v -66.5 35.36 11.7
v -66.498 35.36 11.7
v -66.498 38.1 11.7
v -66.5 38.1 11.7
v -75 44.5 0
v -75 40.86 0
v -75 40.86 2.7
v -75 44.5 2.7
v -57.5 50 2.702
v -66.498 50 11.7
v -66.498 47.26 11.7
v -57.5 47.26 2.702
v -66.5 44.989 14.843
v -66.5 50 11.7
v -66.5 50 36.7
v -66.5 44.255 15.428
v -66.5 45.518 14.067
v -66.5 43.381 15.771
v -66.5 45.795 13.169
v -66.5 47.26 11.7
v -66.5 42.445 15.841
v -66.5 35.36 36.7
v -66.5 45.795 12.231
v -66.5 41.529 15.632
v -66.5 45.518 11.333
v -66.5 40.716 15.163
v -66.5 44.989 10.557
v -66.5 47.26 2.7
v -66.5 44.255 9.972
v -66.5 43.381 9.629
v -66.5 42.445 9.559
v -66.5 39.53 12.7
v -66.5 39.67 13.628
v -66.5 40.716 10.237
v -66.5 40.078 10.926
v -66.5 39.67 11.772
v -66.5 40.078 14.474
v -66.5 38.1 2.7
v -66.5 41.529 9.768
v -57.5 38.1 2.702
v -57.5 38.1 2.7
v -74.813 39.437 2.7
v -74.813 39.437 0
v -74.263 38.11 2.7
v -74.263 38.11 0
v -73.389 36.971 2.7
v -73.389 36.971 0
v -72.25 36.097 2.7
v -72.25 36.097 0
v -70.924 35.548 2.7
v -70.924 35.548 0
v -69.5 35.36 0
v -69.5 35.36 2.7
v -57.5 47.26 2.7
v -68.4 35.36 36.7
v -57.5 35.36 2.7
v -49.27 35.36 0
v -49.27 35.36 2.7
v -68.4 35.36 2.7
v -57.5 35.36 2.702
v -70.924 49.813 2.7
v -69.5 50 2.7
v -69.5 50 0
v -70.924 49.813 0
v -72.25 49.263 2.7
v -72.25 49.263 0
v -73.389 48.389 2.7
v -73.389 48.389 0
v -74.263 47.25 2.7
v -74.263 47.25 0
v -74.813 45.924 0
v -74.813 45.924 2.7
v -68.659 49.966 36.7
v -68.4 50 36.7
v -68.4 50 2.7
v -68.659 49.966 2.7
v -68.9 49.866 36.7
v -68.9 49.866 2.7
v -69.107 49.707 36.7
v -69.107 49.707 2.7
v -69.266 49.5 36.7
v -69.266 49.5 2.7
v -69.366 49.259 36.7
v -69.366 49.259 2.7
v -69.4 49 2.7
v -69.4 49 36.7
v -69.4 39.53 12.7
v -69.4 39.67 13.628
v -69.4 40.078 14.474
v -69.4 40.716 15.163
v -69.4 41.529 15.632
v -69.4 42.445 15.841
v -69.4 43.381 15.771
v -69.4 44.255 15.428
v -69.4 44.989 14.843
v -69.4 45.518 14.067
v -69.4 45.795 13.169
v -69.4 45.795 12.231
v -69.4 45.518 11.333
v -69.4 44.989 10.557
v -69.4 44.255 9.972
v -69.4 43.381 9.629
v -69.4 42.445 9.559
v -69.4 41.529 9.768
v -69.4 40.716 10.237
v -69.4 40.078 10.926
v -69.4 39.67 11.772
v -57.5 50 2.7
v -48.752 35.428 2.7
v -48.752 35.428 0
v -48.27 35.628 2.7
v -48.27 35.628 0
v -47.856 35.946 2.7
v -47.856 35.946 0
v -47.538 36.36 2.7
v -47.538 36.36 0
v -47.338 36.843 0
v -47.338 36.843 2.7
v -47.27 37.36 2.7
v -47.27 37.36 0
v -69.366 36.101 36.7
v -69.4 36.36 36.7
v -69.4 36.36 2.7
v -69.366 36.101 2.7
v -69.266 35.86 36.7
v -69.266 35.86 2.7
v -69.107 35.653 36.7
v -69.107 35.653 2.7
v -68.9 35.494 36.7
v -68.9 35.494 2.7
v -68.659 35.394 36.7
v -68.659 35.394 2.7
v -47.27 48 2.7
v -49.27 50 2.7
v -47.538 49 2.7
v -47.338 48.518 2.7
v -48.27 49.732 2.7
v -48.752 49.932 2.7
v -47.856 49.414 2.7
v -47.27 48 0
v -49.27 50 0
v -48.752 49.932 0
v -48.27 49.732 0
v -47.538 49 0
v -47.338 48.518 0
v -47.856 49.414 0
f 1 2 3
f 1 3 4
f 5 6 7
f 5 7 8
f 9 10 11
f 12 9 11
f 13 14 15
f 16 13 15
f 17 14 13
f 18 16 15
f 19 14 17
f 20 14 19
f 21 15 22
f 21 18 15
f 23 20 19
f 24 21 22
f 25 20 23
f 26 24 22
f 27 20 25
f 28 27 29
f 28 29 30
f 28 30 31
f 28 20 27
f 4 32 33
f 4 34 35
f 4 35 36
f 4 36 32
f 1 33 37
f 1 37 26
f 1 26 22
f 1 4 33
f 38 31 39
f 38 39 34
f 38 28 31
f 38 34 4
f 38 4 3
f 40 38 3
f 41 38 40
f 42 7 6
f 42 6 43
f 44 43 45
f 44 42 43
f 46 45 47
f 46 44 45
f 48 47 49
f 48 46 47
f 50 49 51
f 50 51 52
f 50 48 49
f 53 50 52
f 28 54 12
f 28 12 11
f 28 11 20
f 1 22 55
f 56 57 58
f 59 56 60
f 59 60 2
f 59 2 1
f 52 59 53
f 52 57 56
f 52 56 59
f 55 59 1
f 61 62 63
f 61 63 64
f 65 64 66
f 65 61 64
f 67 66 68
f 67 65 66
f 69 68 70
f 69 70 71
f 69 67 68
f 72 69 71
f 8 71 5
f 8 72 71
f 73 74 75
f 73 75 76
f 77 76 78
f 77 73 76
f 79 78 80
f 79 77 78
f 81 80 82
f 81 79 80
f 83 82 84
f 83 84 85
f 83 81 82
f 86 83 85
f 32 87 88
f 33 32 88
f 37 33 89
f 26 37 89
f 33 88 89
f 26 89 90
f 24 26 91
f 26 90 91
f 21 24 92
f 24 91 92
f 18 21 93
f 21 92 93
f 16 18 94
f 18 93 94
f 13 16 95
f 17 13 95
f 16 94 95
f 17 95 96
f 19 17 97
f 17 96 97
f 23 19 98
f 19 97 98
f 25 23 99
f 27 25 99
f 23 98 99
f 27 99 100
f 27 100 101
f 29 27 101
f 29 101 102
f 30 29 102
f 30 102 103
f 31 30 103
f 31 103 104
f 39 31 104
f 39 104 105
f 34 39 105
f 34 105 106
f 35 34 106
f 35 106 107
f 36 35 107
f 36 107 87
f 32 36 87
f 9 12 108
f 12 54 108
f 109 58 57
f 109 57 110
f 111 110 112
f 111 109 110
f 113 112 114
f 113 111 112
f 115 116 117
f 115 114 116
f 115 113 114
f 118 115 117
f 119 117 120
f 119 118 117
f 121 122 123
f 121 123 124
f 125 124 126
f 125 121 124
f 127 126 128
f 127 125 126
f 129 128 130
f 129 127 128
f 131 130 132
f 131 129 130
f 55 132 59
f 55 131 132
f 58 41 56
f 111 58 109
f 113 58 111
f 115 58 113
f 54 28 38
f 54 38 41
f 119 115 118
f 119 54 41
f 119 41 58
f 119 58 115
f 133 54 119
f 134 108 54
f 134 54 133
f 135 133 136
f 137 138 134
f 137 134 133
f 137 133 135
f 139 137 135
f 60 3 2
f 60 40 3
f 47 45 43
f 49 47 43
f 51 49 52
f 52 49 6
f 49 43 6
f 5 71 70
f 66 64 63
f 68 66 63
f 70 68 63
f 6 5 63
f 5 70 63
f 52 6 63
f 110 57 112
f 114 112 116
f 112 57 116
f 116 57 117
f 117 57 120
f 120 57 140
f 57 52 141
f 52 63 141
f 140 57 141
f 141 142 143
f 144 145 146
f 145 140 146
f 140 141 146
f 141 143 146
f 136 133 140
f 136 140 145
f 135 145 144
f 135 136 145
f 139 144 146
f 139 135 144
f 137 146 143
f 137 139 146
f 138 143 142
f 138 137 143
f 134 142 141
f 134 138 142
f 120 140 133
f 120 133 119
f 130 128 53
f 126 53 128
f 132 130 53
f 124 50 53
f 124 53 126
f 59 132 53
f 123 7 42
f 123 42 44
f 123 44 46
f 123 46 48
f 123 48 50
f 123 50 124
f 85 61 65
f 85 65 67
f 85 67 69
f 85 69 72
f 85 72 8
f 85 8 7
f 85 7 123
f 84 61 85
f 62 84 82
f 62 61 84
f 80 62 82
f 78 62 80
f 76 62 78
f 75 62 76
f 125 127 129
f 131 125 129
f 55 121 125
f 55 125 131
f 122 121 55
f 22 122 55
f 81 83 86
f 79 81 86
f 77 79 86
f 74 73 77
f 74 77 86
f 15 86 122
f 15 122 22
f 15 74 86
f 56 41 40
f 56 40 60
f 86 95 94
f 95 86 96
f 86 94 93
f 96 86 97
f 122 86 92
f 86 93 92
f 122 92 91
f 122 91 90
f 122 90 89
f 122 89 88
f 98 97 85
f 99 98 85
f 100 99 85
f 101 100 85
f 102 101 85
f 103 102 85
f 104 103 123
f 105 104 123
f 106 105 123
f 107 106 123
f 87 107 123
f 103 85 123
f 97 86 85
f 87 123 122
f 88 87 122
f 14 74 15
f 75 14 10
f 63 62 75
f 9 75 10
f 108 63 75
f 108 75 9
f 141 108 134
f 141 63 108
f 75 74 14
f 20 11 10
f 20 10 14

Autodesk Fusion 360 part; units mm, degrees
sketch "Skizze1" plane through (0, 0, 0) normal (0, 0, 1) x (1, 0, 0)
  line L0 (-75, 50) -> (-47.27, 50)
  line L1 (-47.27, 50) -> (-47.27, 35.3603)
  line L2 (-47.27, 35.3603) -> (-75, 35.3603)
  line L3 (-75, 35.3603) -> (-75, 50)
  line L4 (-69.4, 50) -> (-69.4, 35.3603)
  line L5 (-66.5, 50) -> (-66.5, 35.3603)
  dimension "d1" = 27.73
  dimension "d2" = 5.6
  dimension "d3" = 2.9
extrude "Extrusion1" add sketch "Skizze1" along normal blind 2.7 contours L0 L2 L3 L4 | L0 L1 L2 L5 makes body 1 at (-73.1333, 45.1201, 0) makes body 2 at (-60.09, 45.1201, 0)
extrude "Extrusion2" add sketch "Skizze1" along normal blind 36.7 contours L0 L2 L4 L5 bodies 1 2
sketch "Skizze2" plane through (-69.4, 0, 0) normal (-1, 0, 0) x (0, -1, 0)
  line L0 (-50, 2.7) -> (-35.3603, 2.7)
  line L1 (-35.3603, 2.7) -> (-35.3603, 36.7)
  line L2 (-35.3603, 36.7) -> (-50, 36.7)
  line L3 (-50, 36.7) -> (-50, 2.7)
  line L4 (-42.6802, 2.7) -> (-42.6802, 36.7) construction
  line L5 (-50, 12.7) -> (-35.3603, 12.7) construction
  line L6 (-50, 2.7) -> (-35.3603, 2.7) construction
  circle A0 centre (-42.6802, 12.7) radius 3.15
  dimension "d8" = 10
  dimension "d9" = 6.3
extrude "Extrusion3" cut sketch "Skizze2" against normal blind 3 contours A0 bodies 1
fillet "Abrundung1" radius 5.5 2 edges at (-75, 50, 1.35) (-75, 35.3603, 1.35) on bodies 1
sketch "Skizze3" plane through (0, 0, 2.7) normal (0, 0, 1) x (-1, 0, 0)
  line L0 (47.27, -50) -> (66.5, -50)
  line L1 (66.5, -50) -> (66.5, -35.3603)
  line L2 (66.5, -35.3603) -> (47.27, -35.3603)
  line L3 (47.27, -35.3603) -> (47.27, -50)
  line L4 (66.5, -38.1003) -> (47.27, -38.1003)
  line L5 (47.27, -47.26) -> (66.5, -47.26)
  line L6 (57.5, -38.1003) -> (57.5, -35.3603)
  line L7 (57.5, -47.26) -> (57.5, -50)
  dimension "d14" = 2.74
  dimension "d15" = 2.74
  dimension "d16" = 9
  dimension "d17" = 9
extrude "Extrusion4" add sketch "Skizze3" along normal blind 9 contours L0 L1 L5 L7 | L1 L2 L4 L6 bodies 1
chamfer "Fase2" distance 9 angle 45 2 edges at (-57.5, 36.7303, 11.7) (-57.5, 48.63, 11.7) on bodies 1
fillet "Abrundung2" radius 1 2 edges at (-69.4, 50, 19.7) (-69.4, 35.3603, 19.7) on bodies 1
fillet "Abrundung3" radius 2 2 edges at (-47.27, 50, 1.35) (-47.27, 35.3603, 1.35) on bodies 1
equation "d1 = 20 mm + 7.73 mm"
equation "d6 = 34 mm + 2.7 mm"
equation "d18 = 15 mm - 2.7 mm - 3.3 mm"
